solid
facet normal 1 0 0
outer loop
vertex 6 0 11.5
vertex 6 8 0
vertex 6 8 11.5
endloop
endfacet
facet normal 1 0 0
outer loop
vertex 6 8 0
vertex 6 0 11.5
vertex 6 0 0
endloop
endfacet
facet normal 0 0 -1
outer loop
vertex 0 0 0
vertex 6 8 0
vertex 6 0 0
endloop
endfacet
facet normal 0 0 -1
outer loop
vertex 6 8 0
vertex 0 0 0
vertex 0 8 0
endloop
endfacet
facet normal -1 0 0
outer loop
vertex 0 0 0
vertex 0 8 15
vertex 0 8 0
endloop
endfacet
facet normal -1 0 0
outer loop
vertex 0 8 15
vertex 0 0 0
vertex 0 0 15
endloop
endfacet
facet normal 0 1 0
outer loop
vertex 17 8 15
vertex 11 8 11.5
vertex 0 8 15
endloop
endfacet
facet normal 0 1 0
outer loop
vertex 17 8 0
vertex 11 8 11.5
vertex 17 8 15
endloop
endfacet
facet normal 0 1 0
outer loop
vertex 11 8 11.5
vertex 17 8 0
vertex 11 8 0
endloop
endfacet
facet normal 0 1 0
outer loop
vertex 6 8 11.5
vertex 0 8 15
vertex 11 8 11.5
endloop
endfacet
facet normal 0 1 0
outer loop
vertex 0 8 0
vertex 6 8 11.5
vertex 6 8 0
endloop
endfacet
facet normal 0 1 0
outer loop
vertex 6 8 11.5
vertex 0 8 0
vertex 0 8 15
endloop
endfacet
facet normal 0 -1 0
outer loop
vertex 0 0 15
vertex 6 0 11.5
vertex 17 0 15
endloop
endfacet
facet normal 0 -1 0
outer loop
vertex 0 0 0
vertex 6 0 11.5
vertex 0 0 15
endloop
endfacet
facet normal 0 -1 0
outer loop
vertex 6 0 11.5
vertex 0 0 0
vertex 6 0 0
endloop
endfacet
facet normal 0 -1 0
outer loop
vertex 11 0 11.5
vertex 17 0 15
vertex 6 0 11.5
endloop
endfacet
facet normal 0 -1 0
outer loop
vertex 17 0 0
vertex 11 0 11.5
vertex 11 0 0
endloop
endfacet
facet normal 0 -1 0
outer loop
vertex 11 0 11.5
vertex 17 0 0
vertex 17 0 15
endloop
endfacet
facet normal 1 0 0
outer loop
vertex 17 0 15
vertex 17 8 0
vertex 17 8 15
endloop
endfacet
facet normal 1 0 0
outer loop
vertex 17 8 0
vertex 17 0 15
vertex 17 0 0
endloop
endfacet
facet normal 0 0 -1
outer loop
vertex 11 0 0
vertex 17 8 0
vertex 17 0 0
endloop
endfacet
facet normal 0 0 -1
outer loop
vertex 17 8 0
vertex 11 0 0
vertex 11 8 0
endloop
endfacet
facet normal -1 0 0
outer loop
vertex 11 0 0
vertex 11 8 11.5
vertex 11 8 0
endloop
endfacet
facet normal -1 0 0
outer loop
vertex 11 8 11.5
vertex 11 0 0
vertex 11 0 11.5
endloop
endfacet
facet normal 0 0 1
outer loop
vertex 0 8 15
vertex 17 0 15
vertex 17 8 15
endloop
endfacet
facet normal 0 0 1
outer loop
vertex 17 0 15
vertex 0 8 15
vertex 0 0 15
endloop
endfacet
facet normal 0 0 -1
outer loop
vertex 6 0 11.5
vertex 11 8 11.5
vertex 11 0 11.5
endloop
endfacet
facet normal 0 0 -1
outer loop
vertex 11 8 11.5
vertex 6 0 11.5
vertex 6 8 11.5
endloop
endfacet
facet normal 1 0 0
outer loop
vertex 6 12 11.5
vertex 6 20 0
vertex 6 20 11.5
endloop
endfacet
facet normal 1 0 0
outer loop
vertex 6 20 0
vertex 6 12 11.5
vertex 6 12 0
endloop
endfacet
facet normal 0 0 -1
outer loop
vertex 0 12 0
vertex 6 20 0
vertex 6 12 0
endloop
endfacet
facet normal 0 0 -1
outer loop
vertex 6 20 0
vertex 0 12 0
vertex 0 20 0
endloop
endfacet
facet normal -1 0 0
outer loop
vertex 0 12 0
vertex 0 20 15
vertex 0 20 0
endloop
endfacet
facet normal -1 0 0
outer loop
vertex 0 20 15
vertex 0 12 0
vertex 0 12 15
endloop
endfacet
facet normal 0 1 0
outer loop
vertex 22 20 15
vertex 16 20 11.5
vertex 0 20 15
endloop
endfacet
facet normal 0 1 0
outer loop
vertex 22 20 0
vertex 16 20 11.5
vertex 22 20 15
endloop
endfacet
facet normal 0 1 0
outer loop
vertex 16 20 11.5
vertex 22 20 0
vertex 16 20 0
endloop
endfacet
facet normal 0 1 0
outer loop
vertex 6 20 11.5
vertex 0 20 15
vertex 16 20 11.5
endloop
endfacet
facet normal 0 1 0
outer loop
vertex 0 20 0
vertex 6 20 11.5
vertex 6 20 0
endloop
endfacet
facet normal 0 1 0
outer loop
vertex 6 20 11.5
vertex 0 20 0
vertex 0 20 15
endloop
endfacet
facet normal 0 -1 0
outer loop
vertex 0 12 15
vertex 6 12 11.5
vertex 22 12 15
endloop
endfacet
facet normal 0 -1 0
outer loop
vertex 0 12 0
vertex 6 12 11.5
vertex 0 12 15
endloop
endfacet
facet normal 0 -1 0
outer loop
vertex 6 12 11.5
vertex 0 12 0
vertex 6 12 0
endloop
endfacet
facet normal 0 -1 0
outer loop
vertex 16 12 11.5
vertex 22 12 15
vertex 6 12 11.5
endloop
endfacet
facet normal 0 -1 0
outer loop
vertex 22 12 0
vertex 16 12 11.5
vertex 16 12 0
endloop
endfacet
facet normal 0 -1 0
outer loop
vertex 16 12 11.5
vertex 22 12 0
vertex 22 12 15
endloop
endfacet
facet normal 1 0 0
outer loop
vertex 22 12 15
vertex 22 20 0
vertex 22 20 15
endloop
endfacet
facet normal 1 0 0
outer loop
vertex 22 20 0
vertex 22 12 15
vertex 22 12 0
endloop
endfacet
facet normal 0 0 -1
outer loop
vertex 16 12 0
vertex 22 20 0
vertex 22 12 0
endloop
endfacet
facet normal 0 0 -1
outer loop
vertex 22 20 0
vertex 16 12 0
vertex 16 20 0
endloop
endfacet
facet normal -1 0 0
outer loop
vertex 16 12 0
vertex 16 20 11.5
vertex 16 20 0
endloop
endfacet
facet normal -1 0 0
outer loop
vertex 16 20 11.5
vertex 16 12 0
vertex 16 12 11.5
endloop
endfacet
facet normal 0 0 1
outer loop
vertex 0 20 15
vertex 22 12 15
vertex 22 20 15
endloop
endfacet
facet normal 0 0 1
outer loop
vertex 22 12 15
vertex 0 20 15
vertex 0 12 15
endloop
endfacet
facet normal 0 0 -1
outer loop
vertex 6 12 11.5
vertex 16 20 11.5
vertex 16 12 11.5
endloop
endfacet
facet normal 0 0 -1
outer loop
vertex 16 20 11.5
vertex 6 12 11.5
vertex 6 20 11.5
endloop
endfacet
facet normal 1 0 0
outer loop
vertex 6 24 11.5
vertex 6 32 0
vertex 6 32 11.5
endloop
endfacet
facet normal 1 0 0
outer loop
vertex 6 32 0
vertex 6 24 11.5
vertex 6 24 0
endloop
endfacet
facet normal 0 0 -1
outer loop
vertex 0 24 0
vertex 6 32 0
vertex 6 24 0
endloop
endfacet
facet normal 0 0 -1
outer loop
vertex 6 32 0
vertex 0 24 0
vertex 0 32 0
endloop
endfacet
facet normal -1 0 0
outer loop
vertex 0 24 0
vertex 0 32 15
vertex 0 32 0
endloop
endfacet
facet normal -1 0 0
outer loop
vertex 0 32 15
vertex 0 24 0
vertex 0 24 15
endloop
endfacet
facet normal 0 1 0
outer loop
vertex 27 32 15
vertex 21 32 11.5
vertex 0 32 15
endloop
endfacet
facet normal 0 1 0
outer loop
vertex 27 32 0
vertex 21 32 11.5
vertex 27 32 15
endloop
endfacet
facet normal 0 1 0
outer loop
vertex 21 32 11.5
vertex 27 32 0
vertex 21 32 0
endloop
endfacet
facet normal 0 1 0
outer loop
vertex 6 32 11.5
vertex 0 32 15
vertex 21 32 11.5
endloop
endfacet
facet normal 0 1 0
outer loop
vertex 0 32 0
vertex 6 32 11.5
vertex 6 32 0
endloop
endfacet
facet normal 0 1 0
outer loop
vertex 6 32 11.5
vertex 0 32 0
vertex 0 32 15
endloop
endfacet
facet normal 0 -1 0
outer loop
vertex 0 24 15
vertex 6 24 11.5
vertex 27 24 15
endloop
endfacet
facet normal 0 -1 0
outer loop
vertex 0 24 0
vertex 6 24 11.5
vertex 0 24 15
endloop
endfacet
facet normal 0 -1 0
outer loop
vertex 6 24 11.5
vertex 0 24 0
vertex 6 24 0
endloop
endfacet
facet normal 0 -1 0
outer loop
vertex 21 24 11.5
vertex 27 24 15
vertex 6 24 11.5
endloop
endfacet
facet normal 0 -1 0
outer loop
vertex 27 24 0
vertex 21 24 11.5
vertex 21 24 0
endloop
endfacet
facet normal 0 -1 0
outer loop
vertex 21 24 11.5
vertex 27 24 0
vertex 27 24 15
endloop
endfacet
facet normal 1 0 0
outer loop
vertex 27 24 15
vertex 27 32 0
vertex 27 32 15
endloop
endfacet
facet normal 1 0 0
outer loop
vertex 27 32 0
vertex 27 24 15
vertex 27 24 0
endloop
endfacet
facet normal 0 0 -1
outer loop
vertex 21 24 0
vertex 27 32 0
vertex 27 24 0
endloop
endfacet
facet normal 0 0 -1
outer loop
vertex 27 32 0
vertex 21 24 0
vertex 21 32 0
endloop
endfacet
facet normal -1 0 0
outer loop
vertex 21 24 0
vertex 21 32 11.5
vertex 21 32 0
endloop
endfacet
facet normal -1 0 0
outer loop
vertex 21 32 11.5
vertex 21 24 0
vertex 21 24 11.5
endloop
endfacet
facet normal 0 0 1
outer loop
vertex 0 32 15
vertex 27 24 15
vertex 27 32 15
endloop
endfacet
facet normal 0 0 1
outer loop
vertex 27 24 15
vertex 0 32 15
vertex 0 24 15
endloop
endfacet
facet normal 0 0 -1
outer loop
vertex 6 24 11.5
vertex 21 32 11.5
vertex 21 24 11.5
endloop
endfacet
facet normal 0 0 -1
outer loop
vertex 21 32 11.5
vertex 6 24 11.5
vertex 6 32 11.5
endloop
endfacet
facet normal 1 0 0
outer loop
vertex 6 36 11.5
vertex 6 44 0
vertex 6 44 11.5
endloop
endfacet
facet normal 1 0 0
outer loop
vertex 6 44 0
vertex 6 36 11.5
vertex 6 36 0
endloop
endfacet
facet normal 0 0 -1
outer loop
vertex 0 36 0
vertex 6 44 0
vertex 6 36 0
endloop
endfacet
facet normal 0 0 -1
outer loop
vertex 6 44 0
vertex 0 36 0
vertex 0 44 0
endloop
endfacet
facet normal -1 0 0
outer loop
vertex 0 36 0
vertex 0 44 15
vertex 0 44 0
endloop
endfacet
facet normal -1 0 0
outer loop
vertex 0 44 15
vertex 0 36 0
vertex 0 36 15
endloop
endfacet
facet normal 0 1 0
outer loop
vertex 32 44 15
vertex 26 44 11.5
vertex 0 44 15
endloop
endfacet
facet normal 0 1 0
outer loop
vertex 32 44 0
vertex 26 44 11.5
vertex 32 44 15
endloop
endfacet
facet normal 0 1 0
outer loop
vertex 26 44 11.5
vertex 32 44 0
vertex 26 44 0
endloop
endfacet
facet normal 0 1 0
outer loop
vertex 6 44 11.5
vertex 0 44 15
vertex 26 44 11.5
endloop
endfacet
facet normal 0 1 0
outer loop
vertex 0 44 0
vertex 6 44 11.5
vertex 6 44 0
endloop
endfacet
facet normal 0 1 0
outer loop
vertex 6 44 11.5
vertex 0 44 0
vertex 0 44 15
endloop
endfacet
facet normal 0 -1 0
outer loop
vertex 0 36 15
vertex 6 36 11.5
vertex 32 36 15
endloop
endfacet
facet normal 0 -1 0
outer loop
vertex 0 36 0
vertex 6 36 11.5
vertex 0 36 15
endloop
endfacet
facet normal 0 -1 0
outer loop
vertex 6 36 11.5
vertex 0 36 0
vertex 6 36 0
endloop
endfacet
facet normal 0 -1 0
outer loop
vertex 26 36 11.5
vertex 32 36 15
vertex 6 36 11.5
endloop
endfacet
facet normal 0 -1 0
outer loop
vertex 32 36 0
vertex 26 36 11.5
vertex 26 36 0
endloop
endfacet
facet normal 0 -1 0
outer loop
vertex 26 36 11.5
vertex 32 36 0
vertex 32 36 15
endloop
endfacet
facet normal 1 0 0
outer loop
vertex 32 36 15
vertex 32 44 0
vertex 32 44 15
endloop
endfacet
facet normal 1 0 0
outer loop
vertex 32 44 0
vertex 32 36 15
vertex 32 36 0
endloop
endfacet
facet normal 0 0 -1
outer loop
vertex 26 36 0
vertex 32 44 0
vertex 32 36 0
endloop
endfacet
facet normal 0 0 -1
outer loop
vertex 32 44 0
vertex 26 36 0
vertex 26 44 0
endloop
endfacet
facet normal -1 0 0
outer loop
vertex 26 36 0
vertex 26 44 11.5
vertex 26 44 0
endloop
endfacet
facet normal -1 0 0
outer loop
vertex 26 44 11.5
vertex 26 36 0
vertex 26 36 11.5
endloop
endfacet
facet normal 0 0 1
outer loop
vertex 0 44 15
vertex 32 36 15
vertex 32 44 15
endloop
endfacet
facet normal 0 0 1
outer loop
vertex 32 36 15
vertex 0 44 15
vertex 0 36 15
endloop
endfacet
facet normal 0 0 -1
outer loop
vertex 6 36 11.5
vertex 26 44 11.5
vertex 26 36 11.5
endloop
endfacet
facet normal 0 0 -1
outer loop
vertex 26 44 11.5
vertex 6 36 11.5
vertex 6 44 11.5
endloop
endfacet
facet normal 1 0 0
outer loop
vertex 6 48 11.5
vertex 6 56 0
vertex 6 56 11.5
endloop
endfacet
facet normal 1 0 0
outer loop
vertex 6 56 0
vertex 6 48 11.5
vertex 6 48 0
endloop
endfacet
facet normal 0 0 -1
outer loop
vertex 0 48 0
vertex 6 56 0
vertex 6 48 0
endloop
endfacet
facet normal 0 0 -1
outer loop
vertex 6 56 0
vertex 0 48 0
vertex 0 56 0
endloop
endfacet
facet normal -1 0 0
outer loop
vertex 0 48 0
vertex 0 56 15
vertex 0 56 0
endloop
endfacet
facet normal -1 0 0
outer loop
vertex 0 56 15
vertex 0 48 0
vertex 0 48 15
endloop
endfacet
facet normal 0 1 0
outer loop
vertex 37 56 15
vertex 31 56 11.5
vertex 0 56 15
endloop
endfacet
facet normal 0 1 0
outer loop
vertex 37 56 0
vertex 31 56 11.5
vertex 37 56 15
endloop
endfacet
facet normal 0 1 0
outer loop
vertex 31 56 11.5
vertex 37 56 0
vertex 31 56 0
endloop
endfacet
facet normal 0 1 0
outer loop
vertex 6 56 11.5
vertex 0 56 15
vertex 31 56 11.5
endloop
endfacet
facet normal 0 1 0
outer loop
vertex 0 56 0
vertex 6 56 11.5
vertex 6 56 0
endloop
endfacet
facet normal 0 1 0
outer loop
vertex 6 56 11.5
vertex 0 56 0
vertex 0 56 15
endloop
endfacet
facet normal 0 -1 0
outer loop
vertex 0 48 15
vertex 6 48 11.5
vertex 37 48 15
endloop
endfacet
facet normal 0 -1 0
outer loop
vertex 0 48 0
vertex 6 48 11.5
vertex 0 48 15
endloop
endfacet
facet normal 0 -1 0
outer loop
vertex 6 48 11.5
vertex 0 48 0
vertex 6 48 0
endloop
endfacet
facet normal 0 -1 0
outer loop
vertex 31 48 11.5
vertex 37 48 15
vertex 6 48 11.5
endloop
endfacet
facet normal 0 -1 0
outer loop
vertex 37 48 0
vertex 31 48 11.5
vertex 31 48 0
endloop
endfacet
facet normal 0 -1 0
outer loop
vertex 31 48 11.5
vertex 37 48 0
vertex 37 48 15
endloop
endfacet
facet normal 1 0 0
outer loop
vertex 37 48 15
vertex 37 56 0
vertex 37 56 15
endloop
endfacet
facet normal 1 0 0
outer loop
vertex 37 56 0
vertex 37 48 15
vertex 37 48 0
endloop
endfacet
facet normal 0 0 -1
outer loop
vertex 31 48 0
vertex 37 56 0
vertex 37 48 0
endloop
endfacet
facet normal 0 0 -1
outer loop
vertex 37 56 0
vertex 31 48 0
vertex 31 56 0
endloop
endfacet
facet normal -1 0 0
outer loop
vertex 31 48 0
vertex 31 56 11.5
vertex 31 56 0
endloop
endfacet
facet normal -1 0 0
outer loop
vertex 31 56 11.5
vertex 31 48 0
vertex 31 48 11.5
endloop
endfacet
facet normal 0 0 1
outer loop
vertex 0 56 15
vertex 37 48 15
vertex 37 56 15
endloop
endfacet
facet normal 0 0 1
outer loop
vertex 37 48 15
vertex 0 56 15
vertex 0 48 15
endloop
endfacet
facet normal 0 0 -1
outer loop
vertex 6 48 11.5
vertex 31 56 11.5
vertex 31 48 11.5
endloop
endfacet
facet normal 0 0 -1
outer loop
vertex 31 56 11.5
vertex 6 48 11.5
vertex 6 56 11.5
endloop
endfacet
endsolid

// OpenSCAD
/*
	bridge-test — 桥接跨度阶梯（5/10/15/20/25 mm）

	测什么
		五个门形件，桥面跨度 5 / 10 / 15 / 20 / 25 mm，桥面离床 12 mm。
		桥面下方没有支撑，全靠挤出线自己拉过去；跨度越大越容易下垂。

	怎么判读
		- 5/10 mm 应当平整；15 mm 开始出现轻微下垂，20 mm 以上常见单根丝下垂。
		- 判据：桥面下表面不塌陷、不断线，视为该跨度可打。
		- 大面积桥接还取决于冷却：桥面下垂先加风扇、降温度、降速度，再考虑加支撑。
		- 桥接合格而悬垂不合格，说明冷却够、但材料在陡斜面上撑不住；
		  反之则先修冷却。两者一起看才能定位问题。
		- 桥面本身是水平朝下的面，会被 print3d_check 判为真悬垂——这是**正确**的，
		  桥接就是"不落支撑的悬垂"，不要因为它报警就去加支撑。

	期望值（默认参数）
		STL 体积 9.300 cm³，包围盒 37.00 × 56.00 × 15.00 mm，5 个独立实体，水密。
		真悬垂面积 ≈6.0 cm² = 五个桥面 (5+10+15+20+25) × 8 mm 宽。
		桥面下沿高度 11.50 mm（压进支柱 0.5 mm，避免共面并集）。

	参数
		span_1..5   五个桥面净跨 (mm)
		pillar_w    支柱沿 X 宽 (mm)
		pillar_d    支柱/桥面沿 Y 深 (mm)
		pillar_h    桥面下沿高度 (mm)
		beam_h      桥面厚度 (mm)
		gap         单元间距 (Y)
		embed       桥面压进支柱的深度，避免两个盒子共面接触
*/

/* [桥接跨度 (mm)] */
span_1 = 5;       // 最容易
span_2 = 10;      // 常规 FDM 能稳过
span_3 = 15;      // 开始考验冷却
span_4 = 20;      // 多数机器开始轻微下垂
span_5 = 25;      // 需要好冷却 / 低速度

/* [尺寸] */
pillar_w = 6;     // 支柱 X
pillar_d = 8;     // 支柱 / 桥面 Y
pillar_h = 12;    // 桥面下沿高度 (Z)
beam_h = 3;       // 桥面厚 (Z)
gap = 4;          // 单元间距 (Y)

/* [并集] */
embed = 0.5;      // 桥面压进支柱的深度 (mm)

assert(pillar_w > 0 && pillar_d > 0 && pillar_h > embed, "支柱尺寸不合法");

spans = [span_1, span_2, span_3, span_4, span_5];
n_units = len(spans);

module bridge_unit(span) {
	len = 2 * pillar_w + span;
	// 两根支柱
	cube([pillar_w, pillar_d, pillar_h]);
	translate([pillar_w + span, 0, 0]) cube([pillar_w, pillar_d, pillar_h]);
	// 桥面：压在支柱顶面下 embed 处起，保证与支柱体积相交
	translate([0, 0, pillar_h - embed]) cube([len, pillar_d, beam_h + embed]);
}

union() {
	for (i = [0:n_units - 1]) {
		translate([0, i * (pillar_d + gap), 0]) bridge_unit(spans[i]);
	}
}
